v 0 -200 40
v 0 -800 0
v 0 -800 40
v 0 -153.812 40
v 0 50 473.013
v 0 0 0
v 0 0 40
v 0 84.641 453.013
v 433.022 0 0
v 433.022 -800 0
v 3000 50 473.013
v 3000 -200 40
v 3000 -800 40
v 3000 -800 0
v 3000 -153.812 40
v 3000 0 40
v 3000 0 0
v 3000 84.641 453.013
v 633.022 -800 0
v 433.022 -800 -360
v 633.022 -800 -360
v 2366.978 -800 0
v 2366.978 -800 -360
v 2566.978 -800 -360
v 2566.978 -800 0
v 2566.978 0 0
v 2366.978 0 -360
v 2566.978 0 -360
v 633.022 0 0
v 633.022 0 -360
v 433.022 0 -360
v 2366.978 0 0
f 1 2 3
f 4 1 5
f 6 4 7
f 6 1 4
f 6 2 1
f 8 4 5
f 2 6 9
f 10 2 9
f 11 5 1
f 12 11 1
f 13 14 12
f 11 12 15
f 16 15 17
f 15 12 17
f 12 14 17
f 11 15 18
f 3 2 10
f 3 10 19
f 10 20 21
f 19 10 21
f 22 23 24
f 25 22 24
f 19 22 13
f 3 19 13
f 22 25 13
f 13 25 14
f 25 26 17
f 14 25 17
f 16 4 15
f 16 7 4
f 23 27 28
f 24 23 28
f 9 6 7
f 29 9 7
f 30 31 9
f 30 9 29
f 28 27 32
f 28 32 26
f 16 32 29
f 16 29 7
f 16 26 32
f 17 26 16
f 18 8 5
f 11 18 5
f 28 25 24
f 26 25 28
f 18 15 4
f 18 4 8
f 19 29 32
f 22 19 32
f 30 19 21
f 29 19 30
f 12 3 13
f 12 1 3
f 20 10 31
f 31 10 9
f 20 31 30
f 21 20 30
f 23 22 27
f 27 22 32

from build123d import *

# Parameters (mm, degrees)
F0_W     = 3000
F0_H     = 800
F1_DEPTH = 40
F2_W     = 200
F2_H     = 800
F3_DEPTH = 400
F5_DEPTH = 3000


with BuildPart() as f1:
    # F0 (on Top) → F1 (new body)
    with BuildSketch(Plane.XY):
        with Locations((1500, -400)):
            Rectangle(F0_W, F0_H)
    extrude(amount=F1_DEPTH)

    # F2 (on face) → F3 (join)
    with BuildSketch(Plane.XY.offset(40)):
        with Locations((533.02229, -400)):
            Rectangle(F2_W, F2_H)
        with Locations((2466.97771, -400)):
            Rectangle(F2_W, F2_H)
    extrude(amount=-F3_DEPTH)

    # F4 (on Right) → F5 (join, through all)
    with BuildSketch(Plane.YZ):
        Polygon((-165.358984, 20), (84.641016, 453.012702), (50, 473.012702), (-200, 40), align=None)
    extrude(amount=F5_DEPTH)


solid = f1.part
